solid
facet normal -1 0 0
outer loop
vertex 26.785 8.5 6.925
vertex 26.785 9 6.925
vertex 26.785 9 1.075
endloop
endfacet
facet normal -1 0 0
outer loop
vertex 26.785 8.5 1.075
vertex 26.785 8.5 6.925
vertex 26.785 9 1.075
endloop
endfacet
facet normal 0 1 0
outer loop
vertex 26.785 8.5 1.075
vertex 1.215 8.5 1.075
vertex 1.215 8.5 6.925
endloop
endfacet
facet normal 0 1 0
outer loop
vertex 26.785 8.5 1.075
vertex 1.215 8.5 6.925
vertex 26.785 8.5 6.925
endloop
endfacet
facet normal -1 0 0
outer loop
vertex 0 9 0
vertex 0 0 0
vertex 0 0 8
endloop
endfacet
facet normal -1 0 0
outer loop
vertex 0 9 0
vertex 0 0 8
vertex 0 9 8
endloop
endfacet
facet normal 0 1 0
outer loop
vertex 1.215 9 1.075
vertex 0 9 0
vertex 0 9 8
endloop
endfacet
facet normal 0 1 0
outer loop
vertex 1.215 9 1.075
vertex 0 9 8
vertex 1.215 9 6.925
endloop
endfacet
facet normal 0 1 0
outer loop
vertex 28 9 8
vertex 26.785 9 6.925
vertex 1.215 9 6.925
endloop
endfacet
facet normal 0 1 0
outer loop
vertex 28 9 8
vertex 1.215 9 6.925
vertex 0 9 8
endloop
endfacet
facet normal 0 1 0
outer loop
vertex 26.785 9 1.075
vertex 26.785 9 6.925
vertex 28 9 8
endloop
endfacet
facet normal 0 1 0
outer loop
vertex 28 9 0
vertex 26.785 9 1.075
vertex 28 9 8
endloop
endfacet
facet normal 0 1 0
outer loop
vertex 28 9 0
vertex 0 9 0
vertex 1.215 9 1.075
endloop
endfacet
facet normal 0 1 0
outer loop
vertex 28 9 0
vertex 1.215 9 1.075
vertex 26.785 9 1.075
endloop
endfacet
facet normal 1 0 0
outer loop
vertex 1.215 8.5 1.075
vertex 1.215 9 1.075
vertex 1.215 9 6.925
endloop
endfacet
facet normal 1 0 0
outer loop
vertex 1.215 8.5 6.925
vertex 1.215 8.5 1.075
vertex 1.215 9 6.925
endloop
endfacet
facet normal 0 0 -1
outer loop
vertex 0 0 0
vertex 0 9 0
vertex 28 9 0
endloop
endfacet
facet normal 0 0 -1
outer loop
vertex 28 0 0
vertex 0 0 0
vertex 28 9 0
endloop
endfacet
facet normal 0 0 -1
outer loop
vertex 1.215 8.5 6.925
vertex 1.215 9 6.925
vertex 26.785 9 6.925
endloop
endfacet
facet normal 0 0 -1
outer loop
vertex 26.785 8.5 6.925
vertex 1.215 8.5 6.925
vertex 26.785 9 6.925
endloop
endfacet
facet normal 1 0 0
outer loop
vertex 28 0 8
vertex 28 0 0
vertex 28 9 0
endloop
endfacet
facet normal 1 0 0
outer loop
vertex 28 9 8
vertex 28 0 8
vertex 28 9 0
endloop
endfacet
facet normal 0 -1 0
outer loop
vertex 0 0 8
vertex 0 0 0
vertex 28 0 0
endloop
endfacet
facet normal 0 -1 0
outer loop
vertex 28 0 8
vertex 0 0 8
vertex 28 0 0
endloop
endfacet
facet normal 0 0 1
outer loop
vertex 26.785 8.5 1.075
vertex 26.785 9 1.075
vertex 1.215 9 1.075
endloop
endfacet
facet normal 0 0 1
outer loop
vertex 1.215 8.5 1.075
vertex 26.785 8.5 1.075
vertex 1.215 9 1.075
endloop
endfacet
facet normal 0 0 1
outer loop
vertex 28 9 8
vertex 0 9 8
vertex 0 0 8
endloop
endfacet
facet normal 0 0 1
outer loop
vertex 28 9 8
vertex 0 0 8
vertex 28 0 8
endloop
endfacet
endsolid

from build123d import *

# Parameters (mm, degrees)
SKETCH1_W           = 28
SKETCH1_H           = 9
BOSS_EXTRUDE1_DEPTH = 8
CUT_EXTRUDE1_DEPTH  = 0.5


with BuildPart() as part:
    # Sketch1 → Boss-Extrude1 (new body)
    with BuildSketch(Plane.XY):
        with Locations((14, 4.5)):
            Rectangle(SKETCH1_W, SKETCH1_H)
    extrude(amount=BOSS_EXTRUDE1_DEPTH)

    # Sketch2 → Cut-Extrude1 (cut)
    with BuildSketch(Plane(origin=(0, 9, 0), x_dir=(1, 0, 0), z_dir=(0, 1, 0))):
        Polygon((14, -1.074899), (1.215291321, -1.074899), (1.215291321, -4), (1.215291321, -6.925101), (26.784708679, -6.925101), (26.784708679, -1.074899), align=None)
    extrude(amount=-CUT_EXTRUDE1_DEPTH, mode=Mode.SUBTRACT)


solid = part.part
